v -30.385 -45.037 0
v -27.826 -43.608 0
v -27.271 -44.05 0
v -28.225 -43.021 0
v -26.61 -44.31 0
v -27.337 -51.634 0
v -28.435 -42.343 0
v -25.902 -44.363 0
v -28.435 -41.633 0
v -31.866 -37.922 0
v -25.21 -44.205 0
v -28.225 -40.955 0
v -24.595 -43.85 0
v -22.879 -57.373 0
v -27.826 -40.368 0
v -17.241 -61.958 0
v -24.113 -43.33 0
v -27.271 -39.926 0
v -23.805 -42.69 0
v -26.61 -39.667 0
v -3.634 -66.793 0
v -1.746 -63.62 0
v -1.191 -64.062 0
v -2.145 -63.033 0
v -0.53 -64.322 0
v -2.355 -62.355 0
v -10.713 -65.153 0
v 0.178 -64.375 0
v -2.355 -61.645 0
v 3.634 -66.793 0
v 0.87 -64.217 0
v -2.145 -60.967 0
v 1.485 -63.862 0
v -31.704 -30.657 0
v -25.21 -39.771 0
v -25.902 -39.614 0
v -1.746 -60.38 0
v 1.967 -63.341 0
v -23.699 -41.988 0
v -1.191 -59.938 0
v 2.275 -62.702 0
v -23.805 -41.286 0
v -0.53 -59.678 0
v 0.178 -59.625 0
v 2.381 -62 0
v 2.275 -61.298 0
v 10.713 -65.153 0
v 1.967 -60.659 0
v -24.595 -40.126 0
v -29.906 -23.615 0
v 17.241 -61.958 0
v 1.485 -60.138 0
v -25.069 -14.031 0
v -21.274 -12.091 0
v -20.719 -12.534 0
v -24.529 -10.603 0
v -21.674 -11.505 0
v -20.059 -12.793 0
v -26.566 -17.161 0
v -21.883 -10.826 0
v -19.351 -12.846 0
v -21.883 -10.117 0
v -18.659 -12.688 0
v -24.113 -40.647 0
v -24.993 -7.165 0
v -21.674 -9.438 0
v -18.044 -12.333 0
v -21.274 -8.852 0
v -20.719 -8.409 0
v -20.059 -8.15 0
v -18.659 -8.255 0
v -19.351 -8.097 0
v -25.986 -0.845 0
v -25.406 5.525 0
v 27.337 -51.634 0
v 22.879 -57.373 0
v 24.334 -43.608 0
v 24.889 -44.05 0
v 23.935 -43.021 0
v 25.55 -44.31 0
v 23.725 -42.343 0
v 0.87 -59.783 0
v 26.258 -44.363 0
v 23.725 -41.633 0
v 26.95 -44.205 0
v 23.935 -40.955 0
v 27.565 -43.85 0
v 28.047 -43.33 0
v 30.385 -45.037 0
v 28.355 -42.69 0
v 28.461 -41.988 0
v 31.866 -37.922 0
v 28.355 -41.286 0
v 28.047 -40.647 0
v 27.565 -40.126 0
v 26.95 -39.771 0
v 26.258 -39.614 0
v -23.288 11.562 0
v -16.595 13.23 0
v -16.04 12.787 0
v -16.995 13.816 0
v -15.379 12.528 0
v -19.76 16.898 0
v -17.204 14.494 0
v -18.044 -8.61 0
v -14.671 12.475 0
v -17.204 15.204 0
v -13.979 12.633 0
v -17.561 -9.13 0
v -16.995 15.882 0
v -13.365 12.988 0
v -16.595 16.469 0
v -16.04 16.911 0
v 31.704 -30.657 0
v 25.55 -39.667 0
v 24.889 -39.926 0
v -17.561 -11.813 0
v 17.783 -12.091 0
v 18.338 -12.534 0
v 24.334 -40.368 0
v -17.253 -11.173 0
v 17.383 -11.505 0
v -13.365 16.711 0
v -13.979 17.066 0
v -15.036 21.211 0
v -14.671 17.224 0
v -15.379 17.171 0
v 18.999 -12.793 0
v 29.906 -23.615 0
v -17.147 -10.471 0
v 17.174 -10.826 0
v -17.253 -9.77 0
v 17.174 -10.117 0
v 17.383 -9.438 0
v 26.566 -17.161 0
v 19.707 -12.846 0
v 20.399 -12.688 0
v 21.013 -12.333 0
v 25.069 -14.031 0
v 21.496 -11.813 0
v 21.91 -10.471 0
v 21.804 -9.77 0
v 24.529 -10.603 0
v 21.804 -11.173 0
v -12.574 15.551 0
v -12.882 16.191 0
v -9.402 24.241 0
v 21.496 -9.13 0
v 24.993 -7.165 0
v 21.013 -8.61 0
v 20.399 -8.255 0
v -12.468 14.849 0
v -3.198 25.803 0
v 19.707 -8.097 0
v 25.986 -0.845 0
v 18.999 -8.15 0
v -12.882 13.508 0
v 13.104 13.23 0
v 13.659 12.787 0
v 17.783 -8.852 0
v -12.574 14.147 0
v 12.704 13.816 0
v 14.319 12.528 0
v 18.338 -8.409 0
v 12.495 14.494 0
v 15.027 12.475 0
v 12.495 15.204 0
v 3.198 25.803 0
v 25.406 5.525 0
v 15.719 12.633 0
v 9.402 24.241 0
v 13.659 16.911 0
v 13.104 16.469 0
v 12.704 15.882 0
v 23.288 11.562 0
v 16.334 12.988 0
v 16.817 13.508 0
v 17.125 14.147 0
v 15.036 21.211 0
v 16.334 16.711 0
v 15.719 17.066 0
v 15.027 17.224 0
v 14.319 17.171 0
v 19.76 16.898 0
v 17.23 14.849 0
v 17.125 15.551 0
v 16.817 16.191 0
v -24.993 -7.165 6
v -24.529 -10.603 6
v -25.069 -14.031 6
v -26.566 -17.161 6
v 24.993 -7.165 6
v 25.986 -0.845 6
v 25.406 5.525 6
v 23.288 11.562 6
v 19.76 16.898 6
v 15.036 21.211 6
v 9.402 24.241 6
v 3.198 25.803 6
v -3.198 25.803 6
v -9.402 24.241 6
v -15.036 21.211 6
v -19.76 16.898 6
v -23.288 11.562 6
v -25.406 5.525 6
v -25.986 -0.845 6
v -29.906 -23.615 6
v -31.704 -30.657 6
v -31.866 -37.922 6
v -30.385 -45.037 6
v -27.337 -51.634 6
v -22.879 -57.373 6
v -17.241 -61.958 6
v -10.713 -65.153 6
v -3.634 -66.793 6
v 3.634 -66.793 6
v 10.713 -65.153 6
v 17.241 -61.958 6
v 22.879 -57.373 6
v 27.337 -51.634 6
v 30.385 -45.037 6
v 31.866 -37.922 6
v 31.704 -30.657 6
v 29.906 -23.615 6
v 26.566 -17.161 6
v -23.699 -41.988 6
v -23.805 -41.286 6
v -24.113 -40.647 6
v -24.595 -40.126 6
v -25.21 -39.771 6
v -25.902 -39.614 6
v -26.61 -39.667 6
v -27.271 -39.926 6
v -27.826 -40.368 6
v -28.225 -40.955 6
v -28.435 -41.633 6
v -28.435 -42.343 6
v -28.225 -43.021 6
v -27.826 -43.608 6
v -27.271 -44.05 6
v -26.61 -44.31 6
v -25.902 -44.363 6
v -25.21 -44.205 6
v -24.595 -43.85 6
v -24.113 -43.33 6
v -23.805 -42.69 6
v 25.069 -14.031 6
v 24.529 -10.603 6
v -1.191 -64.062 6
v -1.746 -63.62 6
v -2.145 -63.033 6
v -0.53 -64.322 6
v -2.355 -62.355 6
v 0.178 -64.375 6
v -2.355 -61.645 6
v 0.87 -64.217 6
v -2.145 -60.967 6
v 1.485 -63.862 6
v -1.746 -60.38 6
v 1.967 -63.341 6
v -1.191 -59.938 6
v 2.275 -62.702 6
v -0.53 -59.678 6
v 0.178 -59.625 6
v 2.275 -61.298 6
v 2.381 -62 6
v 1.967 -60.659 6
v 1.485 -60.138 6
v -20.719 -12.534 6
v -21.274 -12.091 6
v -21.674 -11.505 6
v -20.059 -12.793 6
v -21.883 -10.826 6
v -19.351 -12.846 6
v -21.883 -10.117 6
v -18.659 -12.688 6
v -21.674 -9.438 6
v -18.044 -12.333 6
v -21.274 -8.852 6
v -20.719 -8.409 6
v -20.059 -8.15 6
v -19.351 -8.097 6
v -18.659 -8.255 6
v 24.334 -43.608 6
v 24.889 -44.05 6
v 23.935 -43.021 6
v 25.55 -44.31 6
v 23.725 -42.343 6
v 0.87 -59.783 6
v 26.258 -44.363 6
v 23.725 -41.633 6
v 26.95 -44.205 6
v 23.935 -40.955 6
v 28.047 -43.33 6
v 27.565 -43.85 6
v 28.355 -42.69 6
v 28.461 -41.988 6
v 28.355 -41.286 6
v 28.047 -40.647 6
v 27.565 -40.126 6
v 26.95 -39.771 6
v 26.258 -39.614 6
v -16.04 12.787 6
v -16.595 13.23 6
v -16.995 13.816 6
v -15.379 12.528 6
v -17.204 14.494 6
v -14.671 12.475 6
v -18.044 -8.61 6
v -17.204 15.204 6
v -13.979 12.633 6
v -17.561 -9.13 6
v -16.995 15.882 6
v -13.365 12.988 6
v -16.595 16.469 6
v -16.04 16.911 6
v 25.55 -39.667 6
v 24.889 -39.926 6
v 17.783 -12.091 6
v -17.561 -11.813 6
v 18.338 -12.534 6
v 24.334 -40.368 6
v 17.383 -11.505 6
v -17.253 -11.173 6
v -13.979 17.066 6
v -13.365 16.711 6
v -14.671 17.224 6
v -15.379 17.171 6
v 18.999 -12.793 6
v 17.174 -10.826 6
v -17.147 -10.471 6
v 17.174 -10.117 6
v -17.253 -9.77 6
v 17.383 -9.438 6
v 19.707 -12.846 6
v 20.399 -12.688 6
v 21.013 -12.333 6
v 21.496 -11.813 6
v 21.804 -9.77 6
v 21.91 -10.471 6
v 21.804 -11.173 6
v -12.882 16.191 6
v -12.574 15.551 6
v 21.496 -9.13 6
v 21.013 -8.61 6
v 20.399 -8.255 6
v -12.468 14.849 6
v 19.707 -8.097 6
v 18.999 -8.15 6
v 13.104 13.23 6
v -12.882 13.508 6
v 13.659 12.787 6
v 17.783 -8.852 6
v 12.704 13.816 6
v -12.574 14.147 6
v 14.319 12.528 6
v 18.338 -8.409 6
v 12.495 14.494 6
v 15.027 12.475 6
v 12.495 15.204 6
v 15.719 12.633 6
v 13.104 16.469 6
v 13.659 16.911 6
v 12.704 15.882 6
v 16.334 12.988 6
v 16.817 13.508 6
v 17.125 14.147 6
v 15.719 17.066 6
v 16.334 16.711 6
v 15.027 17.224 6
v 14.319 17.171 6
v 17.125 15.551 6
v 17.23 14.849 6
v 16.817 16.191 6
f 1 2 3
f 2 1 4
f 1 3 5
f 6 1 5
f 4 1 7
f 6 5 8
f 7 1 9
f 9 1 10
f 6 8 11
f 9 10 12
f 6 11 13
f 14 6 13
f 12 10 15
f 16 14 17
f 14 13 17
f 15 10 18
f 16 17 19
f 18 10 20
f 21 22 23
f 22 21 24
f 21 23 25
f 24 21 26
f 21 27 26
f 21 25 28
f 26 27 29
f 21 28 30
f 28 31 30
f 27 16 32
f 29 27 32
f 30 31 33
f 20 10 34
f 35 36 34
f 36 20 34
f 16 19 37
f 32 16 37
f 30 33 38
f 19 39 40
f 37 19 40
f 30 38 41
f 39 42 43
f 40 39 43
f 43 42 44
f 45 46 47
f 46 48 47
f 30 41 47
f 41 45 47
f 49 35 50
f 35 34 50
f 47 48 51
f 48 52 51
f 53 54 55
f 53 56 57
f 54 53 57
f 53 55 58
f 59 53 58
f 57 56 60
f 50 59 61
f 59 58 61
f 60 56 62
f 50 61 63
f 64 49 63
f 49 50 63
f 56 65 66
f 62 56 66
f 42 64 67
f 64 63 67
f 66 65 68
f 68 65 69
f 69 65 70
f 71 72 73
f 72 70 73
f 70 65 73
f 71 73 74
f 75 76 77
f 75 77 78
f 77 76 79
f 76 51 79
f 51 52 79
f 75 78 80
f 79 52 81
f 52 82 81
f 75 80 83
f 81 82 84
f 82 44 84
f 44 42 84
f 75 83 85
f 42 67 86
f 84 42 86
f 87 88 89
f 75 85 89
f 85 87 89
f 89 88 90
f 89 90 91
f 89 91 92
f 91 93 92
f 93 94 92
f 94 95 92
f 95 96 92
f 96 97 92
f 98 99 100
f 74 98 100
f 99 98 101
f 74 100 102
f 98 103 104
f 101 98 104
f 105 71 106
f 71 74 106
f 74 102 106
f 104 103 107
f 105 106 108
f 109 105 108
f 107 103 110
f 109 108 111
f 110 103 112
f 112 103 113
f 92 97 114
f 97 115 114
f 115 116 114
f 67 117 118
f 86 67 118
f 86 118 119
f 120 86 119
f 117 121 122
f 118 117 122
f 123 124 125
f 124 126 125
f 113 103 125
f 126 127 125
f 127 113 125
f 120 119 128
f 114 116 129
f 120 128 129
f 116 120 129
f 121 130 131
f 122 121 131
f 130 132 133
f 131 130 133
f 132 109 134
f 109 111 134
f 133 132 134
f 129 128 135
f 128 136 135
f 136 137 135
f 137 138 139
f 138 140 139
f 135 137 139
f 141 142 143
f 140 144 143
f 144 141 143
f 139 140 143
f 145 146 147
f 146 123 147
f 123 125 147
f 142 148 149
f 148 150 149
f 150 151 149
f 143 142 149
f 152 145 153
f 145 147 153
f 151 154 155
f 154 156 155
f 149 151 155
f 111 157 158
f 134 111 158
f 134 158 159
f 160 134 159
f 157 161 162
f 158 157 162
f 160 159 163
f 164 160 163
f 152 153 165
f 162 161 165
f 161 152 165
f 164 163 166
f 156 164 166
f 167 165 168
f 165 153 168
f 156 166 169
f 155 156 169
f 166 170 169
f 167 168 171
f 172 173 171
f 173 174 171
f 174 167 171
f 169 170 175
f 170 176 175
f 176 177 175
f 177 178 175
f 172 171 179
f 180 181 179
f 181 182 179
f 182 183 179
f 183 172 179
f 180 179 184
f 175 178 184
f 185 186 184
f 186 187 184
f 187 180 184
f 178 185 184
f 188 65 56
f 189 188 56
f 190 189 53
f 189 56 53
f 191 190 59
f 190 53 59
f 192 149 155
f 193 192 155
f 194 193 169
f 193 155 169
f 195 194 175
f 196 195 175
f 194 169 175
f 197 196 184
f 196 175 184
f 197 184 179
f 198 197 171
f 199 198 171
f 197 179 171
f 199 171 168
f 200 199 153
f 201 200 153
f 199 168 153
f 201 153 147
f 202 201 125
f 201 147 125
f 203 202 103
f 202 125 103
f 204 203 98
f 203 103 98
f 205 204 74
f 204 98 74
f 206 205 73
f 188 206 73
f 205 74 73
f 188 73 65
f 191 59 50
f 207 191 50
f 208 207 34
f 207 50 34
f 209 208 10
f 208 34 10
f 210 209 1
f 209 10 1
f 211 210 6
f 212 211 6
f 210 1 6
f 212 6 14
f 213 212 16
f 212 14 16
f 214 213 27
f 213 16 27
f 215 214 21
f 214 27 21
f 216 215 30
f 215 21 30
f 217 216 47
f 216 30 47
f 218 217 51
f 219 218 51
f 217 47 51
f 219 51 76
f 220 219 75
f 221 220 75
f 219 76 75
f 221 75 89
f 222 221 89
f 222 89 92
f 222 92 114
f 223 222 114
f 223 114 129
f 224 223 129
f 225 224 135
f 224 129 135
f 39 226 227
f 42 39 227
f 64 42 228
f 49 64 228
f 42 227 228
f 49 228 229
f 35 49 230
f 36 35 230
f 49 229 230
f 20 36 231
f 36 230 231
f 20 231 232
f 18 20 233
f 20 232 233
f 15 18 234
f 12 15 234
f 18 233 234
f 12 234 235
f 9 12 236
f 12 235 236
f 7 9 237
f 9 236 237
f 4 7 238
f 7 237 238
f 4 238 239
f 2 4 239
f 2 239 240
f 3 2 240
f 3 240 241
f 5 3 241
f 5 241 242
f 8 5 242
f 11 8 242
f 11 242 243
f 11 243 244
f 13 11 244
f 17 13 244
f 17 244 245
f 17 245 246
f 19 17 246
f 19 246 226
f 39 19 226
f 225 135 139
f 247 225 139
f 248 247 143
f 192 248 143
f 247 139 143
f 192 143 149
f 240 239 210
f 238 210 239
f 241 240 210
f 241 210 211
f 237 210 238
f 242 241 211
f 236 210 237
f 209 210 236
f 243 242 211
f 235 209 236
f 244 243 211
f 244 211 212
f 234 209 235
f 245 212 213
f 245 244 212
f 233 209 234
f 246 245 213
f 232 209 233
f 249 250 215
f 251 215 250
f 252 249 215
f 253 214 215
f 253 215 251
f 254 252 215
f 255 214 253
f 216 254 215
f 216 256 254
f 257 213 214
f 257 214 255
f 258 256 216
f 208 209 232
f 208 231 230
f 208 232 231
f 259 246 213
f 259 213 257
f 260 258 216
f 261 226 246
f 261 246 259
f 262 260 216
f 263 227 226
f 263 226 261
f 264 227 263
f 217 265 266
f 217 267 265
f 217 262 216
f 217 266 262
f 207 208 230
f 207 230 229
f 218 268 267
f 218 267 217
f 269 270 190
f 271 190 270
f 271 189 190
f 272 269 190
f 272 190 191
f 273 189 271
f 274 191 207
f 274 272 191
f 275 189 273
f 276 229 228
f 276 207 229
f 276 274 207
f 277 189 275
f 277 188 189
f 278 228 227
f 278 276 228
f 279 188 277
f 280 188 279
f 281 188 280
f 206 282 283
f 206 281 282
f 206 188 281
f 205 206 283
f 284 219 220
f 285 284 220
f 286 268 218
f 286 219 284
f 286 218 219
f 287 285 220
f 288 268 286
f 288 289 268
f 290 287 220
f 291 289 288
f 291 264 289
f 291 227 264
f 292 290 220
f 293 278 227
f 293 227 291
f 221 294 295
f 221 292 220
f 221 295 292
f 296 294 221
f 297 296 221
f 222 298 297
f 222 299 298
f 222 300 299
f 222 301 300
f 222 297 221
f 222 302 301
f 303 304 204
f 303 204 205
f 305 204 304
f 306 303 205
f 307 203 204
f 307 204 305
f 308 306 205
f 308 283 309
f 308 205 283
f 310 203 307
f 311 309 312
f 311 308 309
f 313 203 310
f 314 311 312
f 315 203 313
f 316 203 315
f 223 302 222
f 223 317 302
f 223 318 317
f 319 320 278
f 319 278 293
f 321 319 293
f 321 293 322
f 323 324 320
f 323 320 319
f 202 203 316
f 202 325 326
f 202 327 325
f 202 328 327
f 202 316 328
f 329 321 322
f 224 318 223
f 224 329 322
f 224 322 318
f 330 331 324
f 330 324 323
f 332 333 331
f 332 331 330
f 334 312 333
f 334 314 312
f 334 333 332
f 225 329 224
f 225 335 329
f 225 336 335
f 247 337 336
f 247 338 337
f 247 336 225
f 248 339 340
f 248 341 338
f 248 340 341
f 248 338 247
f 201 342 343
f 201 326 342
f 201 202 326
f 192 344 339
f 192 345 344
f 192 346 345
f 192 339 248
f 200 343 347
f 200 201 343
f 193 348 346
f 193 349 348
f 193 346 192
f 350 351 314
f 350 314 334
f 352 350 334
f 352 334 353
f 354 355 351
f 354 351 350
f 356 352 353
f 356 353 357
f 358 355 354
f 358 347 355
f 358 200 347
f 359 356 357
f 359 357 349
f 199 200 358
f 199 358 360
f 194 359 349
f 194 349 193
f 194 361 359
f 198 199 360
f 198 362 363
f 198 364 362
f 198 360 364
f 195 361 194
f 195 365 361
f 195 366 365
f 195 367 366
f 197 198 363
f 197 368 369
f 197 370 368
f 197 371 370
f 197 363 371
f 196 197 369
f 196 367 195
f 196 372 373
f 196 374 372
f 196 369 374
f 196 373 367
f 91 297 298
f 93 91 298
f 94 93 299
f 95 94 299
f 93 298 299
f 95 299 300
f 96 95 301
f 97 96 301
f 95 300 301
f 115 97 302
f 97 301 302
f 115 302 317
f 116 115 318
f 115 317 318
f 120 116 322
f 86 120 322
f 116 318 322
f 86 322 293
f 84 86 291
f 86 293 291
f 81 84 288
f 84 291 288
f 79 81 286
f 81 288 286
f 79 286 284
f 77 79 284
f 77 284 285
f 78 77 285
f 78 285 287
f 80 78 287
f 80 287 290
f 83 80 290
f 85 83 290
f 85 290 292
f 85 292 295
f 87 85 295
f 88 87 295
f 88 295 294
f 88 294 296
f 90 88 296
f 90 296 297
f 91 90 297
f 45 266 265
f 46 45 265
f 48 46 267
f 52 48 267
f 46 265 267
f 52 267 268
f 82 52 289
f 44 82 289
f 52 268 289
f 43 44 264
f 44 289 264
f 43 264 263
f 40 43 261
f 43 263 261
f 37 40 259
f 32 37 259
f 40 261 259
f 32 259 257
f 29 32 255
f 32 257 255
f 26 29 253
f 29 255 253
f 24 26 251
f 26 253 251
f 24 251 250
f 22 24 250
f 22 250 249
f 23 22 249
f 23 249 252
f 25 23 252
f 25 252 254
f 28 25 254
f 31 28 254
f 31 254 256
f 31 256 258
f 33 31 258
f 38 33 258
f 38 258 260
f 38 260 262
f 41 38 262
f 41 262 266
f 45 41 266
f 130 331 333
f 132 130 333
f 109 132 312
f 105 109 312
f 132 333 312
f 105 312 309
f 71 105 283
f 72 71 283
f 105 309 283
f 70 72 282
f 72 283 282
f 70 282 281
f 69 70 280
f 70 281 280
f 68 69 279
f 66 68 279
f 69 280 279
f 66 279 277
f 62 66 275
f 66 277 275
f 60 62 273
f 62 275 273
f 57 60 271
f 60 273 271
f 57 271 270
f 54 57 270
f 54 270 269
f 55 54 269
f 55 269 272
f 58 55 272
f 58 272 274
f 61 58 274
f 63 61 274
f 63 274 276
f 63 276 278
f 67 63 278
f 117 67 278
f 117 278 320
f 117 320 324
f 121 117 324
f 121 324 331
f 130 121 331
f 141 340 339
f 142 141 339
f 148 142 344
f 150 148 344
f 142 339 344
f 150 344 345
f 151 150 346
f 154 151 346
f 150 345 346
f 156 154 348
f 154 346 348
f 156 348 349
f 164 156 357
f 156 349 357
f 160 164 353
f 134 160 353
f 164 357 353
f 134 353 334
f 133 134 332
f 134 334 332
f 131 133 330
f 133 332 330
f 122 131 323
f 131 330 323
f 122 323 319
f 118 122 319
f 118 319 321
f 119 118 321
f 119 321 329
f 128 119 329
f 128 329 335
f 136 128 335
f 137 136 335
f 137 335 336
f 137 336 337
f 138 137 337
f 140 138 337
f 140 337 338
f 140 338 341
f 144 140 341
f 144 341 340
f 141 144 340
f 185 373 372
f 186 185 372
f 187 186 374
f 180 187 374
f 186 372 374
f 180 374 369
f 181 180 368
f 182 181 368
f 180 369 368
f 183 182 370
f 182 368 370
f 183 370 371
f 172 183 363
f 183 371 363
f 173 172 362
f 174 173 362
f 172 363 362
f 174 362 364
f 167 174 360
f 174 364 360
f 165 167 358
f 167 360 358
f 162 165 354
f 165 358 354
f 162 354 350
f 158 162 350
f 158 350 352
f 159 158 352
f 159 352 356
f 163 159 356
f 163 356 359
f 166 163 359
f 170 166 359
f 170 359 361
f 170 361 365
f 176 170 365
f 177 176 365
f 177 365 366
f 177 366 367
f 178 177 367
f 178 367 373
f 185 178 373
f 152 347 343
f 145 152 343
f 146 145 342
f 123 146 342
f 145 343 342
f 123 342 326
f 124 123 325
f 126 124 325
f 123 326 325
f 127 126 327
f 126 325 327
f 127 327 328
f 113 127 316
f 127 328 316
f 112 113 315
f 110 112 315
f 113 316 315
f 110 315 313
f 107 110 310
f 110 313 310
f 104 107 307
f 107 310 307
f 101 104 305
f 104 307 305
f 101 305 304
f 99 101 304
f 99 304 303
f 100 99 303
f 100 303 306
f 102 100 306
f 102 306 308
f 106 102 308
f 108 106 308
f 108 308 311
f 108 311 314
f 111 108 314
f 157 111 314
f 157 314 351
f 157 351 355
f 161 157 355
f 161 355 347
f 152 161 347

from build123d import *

# Parameters (mm, degrees)
RESSALTO_EXTRUS_O1_DEPTH = 6
ESBO_O2_R                = 2.38125
CORTE_EXTRUS_O1_DEPTH    = 75.491610266


with BuildPart() as part:
    # Esboço1 → Ressalto-extrusão1 (new body)
    with BuildSketch(Plane.XY):
        with BuildLine():
            ThreePointArc((24.993351584, -7.164661654), (0, 26), (-24.993351584, -7.164661654))
            ThreePointArc((-24.993351584, -7.164661654), (-24.67461016, -12.336769329), (-26.566359725, -17.161038961))
            ThreePointArc((-26.566359725, -17.161038961), (0, -67), (26.566359725, -17.161038961))
            ThreePointArc((26.566359725, -17.161038961), (24.67461016, -12.336769329), (24.993351584, -7.164661654))
        make_face()
    extrude(amount=RESSALTO_EXTRUS_O1_DEPTH)

    # Esboço2 → Corte-extrusão1 (cut, through all)
    with BuildSketch(Plane.XY.offset(6)):
        with Locations((-14.849242405, 14.849242405)):
            Circle(ESBO_O2_R)
        with Locations((-19.528744622, -10.471428571)):
            Circle(ESBO_O2_R)
        with Locations((14.849242405, 14.849242405)):
            Circle(ESBO_O2_R)
        with Locations((19.528744622, -10.471428571)):
            Circle(ESBO_O2_R)
        with Locations((-26.07999731, -41.988114218)):
            Circle(ESBO_O2_R)
        with Locations((0, -62)):
            Circle(ESBO_O2_R)
        with Locations((26.07999731, -41.988114218)):
            Circle(ESBO_O2_R)
    extrude(amount=-CORTE_EXTRUS_O1_DEPTH, mode=Mode.SUBTRACT)


solid = part.part
